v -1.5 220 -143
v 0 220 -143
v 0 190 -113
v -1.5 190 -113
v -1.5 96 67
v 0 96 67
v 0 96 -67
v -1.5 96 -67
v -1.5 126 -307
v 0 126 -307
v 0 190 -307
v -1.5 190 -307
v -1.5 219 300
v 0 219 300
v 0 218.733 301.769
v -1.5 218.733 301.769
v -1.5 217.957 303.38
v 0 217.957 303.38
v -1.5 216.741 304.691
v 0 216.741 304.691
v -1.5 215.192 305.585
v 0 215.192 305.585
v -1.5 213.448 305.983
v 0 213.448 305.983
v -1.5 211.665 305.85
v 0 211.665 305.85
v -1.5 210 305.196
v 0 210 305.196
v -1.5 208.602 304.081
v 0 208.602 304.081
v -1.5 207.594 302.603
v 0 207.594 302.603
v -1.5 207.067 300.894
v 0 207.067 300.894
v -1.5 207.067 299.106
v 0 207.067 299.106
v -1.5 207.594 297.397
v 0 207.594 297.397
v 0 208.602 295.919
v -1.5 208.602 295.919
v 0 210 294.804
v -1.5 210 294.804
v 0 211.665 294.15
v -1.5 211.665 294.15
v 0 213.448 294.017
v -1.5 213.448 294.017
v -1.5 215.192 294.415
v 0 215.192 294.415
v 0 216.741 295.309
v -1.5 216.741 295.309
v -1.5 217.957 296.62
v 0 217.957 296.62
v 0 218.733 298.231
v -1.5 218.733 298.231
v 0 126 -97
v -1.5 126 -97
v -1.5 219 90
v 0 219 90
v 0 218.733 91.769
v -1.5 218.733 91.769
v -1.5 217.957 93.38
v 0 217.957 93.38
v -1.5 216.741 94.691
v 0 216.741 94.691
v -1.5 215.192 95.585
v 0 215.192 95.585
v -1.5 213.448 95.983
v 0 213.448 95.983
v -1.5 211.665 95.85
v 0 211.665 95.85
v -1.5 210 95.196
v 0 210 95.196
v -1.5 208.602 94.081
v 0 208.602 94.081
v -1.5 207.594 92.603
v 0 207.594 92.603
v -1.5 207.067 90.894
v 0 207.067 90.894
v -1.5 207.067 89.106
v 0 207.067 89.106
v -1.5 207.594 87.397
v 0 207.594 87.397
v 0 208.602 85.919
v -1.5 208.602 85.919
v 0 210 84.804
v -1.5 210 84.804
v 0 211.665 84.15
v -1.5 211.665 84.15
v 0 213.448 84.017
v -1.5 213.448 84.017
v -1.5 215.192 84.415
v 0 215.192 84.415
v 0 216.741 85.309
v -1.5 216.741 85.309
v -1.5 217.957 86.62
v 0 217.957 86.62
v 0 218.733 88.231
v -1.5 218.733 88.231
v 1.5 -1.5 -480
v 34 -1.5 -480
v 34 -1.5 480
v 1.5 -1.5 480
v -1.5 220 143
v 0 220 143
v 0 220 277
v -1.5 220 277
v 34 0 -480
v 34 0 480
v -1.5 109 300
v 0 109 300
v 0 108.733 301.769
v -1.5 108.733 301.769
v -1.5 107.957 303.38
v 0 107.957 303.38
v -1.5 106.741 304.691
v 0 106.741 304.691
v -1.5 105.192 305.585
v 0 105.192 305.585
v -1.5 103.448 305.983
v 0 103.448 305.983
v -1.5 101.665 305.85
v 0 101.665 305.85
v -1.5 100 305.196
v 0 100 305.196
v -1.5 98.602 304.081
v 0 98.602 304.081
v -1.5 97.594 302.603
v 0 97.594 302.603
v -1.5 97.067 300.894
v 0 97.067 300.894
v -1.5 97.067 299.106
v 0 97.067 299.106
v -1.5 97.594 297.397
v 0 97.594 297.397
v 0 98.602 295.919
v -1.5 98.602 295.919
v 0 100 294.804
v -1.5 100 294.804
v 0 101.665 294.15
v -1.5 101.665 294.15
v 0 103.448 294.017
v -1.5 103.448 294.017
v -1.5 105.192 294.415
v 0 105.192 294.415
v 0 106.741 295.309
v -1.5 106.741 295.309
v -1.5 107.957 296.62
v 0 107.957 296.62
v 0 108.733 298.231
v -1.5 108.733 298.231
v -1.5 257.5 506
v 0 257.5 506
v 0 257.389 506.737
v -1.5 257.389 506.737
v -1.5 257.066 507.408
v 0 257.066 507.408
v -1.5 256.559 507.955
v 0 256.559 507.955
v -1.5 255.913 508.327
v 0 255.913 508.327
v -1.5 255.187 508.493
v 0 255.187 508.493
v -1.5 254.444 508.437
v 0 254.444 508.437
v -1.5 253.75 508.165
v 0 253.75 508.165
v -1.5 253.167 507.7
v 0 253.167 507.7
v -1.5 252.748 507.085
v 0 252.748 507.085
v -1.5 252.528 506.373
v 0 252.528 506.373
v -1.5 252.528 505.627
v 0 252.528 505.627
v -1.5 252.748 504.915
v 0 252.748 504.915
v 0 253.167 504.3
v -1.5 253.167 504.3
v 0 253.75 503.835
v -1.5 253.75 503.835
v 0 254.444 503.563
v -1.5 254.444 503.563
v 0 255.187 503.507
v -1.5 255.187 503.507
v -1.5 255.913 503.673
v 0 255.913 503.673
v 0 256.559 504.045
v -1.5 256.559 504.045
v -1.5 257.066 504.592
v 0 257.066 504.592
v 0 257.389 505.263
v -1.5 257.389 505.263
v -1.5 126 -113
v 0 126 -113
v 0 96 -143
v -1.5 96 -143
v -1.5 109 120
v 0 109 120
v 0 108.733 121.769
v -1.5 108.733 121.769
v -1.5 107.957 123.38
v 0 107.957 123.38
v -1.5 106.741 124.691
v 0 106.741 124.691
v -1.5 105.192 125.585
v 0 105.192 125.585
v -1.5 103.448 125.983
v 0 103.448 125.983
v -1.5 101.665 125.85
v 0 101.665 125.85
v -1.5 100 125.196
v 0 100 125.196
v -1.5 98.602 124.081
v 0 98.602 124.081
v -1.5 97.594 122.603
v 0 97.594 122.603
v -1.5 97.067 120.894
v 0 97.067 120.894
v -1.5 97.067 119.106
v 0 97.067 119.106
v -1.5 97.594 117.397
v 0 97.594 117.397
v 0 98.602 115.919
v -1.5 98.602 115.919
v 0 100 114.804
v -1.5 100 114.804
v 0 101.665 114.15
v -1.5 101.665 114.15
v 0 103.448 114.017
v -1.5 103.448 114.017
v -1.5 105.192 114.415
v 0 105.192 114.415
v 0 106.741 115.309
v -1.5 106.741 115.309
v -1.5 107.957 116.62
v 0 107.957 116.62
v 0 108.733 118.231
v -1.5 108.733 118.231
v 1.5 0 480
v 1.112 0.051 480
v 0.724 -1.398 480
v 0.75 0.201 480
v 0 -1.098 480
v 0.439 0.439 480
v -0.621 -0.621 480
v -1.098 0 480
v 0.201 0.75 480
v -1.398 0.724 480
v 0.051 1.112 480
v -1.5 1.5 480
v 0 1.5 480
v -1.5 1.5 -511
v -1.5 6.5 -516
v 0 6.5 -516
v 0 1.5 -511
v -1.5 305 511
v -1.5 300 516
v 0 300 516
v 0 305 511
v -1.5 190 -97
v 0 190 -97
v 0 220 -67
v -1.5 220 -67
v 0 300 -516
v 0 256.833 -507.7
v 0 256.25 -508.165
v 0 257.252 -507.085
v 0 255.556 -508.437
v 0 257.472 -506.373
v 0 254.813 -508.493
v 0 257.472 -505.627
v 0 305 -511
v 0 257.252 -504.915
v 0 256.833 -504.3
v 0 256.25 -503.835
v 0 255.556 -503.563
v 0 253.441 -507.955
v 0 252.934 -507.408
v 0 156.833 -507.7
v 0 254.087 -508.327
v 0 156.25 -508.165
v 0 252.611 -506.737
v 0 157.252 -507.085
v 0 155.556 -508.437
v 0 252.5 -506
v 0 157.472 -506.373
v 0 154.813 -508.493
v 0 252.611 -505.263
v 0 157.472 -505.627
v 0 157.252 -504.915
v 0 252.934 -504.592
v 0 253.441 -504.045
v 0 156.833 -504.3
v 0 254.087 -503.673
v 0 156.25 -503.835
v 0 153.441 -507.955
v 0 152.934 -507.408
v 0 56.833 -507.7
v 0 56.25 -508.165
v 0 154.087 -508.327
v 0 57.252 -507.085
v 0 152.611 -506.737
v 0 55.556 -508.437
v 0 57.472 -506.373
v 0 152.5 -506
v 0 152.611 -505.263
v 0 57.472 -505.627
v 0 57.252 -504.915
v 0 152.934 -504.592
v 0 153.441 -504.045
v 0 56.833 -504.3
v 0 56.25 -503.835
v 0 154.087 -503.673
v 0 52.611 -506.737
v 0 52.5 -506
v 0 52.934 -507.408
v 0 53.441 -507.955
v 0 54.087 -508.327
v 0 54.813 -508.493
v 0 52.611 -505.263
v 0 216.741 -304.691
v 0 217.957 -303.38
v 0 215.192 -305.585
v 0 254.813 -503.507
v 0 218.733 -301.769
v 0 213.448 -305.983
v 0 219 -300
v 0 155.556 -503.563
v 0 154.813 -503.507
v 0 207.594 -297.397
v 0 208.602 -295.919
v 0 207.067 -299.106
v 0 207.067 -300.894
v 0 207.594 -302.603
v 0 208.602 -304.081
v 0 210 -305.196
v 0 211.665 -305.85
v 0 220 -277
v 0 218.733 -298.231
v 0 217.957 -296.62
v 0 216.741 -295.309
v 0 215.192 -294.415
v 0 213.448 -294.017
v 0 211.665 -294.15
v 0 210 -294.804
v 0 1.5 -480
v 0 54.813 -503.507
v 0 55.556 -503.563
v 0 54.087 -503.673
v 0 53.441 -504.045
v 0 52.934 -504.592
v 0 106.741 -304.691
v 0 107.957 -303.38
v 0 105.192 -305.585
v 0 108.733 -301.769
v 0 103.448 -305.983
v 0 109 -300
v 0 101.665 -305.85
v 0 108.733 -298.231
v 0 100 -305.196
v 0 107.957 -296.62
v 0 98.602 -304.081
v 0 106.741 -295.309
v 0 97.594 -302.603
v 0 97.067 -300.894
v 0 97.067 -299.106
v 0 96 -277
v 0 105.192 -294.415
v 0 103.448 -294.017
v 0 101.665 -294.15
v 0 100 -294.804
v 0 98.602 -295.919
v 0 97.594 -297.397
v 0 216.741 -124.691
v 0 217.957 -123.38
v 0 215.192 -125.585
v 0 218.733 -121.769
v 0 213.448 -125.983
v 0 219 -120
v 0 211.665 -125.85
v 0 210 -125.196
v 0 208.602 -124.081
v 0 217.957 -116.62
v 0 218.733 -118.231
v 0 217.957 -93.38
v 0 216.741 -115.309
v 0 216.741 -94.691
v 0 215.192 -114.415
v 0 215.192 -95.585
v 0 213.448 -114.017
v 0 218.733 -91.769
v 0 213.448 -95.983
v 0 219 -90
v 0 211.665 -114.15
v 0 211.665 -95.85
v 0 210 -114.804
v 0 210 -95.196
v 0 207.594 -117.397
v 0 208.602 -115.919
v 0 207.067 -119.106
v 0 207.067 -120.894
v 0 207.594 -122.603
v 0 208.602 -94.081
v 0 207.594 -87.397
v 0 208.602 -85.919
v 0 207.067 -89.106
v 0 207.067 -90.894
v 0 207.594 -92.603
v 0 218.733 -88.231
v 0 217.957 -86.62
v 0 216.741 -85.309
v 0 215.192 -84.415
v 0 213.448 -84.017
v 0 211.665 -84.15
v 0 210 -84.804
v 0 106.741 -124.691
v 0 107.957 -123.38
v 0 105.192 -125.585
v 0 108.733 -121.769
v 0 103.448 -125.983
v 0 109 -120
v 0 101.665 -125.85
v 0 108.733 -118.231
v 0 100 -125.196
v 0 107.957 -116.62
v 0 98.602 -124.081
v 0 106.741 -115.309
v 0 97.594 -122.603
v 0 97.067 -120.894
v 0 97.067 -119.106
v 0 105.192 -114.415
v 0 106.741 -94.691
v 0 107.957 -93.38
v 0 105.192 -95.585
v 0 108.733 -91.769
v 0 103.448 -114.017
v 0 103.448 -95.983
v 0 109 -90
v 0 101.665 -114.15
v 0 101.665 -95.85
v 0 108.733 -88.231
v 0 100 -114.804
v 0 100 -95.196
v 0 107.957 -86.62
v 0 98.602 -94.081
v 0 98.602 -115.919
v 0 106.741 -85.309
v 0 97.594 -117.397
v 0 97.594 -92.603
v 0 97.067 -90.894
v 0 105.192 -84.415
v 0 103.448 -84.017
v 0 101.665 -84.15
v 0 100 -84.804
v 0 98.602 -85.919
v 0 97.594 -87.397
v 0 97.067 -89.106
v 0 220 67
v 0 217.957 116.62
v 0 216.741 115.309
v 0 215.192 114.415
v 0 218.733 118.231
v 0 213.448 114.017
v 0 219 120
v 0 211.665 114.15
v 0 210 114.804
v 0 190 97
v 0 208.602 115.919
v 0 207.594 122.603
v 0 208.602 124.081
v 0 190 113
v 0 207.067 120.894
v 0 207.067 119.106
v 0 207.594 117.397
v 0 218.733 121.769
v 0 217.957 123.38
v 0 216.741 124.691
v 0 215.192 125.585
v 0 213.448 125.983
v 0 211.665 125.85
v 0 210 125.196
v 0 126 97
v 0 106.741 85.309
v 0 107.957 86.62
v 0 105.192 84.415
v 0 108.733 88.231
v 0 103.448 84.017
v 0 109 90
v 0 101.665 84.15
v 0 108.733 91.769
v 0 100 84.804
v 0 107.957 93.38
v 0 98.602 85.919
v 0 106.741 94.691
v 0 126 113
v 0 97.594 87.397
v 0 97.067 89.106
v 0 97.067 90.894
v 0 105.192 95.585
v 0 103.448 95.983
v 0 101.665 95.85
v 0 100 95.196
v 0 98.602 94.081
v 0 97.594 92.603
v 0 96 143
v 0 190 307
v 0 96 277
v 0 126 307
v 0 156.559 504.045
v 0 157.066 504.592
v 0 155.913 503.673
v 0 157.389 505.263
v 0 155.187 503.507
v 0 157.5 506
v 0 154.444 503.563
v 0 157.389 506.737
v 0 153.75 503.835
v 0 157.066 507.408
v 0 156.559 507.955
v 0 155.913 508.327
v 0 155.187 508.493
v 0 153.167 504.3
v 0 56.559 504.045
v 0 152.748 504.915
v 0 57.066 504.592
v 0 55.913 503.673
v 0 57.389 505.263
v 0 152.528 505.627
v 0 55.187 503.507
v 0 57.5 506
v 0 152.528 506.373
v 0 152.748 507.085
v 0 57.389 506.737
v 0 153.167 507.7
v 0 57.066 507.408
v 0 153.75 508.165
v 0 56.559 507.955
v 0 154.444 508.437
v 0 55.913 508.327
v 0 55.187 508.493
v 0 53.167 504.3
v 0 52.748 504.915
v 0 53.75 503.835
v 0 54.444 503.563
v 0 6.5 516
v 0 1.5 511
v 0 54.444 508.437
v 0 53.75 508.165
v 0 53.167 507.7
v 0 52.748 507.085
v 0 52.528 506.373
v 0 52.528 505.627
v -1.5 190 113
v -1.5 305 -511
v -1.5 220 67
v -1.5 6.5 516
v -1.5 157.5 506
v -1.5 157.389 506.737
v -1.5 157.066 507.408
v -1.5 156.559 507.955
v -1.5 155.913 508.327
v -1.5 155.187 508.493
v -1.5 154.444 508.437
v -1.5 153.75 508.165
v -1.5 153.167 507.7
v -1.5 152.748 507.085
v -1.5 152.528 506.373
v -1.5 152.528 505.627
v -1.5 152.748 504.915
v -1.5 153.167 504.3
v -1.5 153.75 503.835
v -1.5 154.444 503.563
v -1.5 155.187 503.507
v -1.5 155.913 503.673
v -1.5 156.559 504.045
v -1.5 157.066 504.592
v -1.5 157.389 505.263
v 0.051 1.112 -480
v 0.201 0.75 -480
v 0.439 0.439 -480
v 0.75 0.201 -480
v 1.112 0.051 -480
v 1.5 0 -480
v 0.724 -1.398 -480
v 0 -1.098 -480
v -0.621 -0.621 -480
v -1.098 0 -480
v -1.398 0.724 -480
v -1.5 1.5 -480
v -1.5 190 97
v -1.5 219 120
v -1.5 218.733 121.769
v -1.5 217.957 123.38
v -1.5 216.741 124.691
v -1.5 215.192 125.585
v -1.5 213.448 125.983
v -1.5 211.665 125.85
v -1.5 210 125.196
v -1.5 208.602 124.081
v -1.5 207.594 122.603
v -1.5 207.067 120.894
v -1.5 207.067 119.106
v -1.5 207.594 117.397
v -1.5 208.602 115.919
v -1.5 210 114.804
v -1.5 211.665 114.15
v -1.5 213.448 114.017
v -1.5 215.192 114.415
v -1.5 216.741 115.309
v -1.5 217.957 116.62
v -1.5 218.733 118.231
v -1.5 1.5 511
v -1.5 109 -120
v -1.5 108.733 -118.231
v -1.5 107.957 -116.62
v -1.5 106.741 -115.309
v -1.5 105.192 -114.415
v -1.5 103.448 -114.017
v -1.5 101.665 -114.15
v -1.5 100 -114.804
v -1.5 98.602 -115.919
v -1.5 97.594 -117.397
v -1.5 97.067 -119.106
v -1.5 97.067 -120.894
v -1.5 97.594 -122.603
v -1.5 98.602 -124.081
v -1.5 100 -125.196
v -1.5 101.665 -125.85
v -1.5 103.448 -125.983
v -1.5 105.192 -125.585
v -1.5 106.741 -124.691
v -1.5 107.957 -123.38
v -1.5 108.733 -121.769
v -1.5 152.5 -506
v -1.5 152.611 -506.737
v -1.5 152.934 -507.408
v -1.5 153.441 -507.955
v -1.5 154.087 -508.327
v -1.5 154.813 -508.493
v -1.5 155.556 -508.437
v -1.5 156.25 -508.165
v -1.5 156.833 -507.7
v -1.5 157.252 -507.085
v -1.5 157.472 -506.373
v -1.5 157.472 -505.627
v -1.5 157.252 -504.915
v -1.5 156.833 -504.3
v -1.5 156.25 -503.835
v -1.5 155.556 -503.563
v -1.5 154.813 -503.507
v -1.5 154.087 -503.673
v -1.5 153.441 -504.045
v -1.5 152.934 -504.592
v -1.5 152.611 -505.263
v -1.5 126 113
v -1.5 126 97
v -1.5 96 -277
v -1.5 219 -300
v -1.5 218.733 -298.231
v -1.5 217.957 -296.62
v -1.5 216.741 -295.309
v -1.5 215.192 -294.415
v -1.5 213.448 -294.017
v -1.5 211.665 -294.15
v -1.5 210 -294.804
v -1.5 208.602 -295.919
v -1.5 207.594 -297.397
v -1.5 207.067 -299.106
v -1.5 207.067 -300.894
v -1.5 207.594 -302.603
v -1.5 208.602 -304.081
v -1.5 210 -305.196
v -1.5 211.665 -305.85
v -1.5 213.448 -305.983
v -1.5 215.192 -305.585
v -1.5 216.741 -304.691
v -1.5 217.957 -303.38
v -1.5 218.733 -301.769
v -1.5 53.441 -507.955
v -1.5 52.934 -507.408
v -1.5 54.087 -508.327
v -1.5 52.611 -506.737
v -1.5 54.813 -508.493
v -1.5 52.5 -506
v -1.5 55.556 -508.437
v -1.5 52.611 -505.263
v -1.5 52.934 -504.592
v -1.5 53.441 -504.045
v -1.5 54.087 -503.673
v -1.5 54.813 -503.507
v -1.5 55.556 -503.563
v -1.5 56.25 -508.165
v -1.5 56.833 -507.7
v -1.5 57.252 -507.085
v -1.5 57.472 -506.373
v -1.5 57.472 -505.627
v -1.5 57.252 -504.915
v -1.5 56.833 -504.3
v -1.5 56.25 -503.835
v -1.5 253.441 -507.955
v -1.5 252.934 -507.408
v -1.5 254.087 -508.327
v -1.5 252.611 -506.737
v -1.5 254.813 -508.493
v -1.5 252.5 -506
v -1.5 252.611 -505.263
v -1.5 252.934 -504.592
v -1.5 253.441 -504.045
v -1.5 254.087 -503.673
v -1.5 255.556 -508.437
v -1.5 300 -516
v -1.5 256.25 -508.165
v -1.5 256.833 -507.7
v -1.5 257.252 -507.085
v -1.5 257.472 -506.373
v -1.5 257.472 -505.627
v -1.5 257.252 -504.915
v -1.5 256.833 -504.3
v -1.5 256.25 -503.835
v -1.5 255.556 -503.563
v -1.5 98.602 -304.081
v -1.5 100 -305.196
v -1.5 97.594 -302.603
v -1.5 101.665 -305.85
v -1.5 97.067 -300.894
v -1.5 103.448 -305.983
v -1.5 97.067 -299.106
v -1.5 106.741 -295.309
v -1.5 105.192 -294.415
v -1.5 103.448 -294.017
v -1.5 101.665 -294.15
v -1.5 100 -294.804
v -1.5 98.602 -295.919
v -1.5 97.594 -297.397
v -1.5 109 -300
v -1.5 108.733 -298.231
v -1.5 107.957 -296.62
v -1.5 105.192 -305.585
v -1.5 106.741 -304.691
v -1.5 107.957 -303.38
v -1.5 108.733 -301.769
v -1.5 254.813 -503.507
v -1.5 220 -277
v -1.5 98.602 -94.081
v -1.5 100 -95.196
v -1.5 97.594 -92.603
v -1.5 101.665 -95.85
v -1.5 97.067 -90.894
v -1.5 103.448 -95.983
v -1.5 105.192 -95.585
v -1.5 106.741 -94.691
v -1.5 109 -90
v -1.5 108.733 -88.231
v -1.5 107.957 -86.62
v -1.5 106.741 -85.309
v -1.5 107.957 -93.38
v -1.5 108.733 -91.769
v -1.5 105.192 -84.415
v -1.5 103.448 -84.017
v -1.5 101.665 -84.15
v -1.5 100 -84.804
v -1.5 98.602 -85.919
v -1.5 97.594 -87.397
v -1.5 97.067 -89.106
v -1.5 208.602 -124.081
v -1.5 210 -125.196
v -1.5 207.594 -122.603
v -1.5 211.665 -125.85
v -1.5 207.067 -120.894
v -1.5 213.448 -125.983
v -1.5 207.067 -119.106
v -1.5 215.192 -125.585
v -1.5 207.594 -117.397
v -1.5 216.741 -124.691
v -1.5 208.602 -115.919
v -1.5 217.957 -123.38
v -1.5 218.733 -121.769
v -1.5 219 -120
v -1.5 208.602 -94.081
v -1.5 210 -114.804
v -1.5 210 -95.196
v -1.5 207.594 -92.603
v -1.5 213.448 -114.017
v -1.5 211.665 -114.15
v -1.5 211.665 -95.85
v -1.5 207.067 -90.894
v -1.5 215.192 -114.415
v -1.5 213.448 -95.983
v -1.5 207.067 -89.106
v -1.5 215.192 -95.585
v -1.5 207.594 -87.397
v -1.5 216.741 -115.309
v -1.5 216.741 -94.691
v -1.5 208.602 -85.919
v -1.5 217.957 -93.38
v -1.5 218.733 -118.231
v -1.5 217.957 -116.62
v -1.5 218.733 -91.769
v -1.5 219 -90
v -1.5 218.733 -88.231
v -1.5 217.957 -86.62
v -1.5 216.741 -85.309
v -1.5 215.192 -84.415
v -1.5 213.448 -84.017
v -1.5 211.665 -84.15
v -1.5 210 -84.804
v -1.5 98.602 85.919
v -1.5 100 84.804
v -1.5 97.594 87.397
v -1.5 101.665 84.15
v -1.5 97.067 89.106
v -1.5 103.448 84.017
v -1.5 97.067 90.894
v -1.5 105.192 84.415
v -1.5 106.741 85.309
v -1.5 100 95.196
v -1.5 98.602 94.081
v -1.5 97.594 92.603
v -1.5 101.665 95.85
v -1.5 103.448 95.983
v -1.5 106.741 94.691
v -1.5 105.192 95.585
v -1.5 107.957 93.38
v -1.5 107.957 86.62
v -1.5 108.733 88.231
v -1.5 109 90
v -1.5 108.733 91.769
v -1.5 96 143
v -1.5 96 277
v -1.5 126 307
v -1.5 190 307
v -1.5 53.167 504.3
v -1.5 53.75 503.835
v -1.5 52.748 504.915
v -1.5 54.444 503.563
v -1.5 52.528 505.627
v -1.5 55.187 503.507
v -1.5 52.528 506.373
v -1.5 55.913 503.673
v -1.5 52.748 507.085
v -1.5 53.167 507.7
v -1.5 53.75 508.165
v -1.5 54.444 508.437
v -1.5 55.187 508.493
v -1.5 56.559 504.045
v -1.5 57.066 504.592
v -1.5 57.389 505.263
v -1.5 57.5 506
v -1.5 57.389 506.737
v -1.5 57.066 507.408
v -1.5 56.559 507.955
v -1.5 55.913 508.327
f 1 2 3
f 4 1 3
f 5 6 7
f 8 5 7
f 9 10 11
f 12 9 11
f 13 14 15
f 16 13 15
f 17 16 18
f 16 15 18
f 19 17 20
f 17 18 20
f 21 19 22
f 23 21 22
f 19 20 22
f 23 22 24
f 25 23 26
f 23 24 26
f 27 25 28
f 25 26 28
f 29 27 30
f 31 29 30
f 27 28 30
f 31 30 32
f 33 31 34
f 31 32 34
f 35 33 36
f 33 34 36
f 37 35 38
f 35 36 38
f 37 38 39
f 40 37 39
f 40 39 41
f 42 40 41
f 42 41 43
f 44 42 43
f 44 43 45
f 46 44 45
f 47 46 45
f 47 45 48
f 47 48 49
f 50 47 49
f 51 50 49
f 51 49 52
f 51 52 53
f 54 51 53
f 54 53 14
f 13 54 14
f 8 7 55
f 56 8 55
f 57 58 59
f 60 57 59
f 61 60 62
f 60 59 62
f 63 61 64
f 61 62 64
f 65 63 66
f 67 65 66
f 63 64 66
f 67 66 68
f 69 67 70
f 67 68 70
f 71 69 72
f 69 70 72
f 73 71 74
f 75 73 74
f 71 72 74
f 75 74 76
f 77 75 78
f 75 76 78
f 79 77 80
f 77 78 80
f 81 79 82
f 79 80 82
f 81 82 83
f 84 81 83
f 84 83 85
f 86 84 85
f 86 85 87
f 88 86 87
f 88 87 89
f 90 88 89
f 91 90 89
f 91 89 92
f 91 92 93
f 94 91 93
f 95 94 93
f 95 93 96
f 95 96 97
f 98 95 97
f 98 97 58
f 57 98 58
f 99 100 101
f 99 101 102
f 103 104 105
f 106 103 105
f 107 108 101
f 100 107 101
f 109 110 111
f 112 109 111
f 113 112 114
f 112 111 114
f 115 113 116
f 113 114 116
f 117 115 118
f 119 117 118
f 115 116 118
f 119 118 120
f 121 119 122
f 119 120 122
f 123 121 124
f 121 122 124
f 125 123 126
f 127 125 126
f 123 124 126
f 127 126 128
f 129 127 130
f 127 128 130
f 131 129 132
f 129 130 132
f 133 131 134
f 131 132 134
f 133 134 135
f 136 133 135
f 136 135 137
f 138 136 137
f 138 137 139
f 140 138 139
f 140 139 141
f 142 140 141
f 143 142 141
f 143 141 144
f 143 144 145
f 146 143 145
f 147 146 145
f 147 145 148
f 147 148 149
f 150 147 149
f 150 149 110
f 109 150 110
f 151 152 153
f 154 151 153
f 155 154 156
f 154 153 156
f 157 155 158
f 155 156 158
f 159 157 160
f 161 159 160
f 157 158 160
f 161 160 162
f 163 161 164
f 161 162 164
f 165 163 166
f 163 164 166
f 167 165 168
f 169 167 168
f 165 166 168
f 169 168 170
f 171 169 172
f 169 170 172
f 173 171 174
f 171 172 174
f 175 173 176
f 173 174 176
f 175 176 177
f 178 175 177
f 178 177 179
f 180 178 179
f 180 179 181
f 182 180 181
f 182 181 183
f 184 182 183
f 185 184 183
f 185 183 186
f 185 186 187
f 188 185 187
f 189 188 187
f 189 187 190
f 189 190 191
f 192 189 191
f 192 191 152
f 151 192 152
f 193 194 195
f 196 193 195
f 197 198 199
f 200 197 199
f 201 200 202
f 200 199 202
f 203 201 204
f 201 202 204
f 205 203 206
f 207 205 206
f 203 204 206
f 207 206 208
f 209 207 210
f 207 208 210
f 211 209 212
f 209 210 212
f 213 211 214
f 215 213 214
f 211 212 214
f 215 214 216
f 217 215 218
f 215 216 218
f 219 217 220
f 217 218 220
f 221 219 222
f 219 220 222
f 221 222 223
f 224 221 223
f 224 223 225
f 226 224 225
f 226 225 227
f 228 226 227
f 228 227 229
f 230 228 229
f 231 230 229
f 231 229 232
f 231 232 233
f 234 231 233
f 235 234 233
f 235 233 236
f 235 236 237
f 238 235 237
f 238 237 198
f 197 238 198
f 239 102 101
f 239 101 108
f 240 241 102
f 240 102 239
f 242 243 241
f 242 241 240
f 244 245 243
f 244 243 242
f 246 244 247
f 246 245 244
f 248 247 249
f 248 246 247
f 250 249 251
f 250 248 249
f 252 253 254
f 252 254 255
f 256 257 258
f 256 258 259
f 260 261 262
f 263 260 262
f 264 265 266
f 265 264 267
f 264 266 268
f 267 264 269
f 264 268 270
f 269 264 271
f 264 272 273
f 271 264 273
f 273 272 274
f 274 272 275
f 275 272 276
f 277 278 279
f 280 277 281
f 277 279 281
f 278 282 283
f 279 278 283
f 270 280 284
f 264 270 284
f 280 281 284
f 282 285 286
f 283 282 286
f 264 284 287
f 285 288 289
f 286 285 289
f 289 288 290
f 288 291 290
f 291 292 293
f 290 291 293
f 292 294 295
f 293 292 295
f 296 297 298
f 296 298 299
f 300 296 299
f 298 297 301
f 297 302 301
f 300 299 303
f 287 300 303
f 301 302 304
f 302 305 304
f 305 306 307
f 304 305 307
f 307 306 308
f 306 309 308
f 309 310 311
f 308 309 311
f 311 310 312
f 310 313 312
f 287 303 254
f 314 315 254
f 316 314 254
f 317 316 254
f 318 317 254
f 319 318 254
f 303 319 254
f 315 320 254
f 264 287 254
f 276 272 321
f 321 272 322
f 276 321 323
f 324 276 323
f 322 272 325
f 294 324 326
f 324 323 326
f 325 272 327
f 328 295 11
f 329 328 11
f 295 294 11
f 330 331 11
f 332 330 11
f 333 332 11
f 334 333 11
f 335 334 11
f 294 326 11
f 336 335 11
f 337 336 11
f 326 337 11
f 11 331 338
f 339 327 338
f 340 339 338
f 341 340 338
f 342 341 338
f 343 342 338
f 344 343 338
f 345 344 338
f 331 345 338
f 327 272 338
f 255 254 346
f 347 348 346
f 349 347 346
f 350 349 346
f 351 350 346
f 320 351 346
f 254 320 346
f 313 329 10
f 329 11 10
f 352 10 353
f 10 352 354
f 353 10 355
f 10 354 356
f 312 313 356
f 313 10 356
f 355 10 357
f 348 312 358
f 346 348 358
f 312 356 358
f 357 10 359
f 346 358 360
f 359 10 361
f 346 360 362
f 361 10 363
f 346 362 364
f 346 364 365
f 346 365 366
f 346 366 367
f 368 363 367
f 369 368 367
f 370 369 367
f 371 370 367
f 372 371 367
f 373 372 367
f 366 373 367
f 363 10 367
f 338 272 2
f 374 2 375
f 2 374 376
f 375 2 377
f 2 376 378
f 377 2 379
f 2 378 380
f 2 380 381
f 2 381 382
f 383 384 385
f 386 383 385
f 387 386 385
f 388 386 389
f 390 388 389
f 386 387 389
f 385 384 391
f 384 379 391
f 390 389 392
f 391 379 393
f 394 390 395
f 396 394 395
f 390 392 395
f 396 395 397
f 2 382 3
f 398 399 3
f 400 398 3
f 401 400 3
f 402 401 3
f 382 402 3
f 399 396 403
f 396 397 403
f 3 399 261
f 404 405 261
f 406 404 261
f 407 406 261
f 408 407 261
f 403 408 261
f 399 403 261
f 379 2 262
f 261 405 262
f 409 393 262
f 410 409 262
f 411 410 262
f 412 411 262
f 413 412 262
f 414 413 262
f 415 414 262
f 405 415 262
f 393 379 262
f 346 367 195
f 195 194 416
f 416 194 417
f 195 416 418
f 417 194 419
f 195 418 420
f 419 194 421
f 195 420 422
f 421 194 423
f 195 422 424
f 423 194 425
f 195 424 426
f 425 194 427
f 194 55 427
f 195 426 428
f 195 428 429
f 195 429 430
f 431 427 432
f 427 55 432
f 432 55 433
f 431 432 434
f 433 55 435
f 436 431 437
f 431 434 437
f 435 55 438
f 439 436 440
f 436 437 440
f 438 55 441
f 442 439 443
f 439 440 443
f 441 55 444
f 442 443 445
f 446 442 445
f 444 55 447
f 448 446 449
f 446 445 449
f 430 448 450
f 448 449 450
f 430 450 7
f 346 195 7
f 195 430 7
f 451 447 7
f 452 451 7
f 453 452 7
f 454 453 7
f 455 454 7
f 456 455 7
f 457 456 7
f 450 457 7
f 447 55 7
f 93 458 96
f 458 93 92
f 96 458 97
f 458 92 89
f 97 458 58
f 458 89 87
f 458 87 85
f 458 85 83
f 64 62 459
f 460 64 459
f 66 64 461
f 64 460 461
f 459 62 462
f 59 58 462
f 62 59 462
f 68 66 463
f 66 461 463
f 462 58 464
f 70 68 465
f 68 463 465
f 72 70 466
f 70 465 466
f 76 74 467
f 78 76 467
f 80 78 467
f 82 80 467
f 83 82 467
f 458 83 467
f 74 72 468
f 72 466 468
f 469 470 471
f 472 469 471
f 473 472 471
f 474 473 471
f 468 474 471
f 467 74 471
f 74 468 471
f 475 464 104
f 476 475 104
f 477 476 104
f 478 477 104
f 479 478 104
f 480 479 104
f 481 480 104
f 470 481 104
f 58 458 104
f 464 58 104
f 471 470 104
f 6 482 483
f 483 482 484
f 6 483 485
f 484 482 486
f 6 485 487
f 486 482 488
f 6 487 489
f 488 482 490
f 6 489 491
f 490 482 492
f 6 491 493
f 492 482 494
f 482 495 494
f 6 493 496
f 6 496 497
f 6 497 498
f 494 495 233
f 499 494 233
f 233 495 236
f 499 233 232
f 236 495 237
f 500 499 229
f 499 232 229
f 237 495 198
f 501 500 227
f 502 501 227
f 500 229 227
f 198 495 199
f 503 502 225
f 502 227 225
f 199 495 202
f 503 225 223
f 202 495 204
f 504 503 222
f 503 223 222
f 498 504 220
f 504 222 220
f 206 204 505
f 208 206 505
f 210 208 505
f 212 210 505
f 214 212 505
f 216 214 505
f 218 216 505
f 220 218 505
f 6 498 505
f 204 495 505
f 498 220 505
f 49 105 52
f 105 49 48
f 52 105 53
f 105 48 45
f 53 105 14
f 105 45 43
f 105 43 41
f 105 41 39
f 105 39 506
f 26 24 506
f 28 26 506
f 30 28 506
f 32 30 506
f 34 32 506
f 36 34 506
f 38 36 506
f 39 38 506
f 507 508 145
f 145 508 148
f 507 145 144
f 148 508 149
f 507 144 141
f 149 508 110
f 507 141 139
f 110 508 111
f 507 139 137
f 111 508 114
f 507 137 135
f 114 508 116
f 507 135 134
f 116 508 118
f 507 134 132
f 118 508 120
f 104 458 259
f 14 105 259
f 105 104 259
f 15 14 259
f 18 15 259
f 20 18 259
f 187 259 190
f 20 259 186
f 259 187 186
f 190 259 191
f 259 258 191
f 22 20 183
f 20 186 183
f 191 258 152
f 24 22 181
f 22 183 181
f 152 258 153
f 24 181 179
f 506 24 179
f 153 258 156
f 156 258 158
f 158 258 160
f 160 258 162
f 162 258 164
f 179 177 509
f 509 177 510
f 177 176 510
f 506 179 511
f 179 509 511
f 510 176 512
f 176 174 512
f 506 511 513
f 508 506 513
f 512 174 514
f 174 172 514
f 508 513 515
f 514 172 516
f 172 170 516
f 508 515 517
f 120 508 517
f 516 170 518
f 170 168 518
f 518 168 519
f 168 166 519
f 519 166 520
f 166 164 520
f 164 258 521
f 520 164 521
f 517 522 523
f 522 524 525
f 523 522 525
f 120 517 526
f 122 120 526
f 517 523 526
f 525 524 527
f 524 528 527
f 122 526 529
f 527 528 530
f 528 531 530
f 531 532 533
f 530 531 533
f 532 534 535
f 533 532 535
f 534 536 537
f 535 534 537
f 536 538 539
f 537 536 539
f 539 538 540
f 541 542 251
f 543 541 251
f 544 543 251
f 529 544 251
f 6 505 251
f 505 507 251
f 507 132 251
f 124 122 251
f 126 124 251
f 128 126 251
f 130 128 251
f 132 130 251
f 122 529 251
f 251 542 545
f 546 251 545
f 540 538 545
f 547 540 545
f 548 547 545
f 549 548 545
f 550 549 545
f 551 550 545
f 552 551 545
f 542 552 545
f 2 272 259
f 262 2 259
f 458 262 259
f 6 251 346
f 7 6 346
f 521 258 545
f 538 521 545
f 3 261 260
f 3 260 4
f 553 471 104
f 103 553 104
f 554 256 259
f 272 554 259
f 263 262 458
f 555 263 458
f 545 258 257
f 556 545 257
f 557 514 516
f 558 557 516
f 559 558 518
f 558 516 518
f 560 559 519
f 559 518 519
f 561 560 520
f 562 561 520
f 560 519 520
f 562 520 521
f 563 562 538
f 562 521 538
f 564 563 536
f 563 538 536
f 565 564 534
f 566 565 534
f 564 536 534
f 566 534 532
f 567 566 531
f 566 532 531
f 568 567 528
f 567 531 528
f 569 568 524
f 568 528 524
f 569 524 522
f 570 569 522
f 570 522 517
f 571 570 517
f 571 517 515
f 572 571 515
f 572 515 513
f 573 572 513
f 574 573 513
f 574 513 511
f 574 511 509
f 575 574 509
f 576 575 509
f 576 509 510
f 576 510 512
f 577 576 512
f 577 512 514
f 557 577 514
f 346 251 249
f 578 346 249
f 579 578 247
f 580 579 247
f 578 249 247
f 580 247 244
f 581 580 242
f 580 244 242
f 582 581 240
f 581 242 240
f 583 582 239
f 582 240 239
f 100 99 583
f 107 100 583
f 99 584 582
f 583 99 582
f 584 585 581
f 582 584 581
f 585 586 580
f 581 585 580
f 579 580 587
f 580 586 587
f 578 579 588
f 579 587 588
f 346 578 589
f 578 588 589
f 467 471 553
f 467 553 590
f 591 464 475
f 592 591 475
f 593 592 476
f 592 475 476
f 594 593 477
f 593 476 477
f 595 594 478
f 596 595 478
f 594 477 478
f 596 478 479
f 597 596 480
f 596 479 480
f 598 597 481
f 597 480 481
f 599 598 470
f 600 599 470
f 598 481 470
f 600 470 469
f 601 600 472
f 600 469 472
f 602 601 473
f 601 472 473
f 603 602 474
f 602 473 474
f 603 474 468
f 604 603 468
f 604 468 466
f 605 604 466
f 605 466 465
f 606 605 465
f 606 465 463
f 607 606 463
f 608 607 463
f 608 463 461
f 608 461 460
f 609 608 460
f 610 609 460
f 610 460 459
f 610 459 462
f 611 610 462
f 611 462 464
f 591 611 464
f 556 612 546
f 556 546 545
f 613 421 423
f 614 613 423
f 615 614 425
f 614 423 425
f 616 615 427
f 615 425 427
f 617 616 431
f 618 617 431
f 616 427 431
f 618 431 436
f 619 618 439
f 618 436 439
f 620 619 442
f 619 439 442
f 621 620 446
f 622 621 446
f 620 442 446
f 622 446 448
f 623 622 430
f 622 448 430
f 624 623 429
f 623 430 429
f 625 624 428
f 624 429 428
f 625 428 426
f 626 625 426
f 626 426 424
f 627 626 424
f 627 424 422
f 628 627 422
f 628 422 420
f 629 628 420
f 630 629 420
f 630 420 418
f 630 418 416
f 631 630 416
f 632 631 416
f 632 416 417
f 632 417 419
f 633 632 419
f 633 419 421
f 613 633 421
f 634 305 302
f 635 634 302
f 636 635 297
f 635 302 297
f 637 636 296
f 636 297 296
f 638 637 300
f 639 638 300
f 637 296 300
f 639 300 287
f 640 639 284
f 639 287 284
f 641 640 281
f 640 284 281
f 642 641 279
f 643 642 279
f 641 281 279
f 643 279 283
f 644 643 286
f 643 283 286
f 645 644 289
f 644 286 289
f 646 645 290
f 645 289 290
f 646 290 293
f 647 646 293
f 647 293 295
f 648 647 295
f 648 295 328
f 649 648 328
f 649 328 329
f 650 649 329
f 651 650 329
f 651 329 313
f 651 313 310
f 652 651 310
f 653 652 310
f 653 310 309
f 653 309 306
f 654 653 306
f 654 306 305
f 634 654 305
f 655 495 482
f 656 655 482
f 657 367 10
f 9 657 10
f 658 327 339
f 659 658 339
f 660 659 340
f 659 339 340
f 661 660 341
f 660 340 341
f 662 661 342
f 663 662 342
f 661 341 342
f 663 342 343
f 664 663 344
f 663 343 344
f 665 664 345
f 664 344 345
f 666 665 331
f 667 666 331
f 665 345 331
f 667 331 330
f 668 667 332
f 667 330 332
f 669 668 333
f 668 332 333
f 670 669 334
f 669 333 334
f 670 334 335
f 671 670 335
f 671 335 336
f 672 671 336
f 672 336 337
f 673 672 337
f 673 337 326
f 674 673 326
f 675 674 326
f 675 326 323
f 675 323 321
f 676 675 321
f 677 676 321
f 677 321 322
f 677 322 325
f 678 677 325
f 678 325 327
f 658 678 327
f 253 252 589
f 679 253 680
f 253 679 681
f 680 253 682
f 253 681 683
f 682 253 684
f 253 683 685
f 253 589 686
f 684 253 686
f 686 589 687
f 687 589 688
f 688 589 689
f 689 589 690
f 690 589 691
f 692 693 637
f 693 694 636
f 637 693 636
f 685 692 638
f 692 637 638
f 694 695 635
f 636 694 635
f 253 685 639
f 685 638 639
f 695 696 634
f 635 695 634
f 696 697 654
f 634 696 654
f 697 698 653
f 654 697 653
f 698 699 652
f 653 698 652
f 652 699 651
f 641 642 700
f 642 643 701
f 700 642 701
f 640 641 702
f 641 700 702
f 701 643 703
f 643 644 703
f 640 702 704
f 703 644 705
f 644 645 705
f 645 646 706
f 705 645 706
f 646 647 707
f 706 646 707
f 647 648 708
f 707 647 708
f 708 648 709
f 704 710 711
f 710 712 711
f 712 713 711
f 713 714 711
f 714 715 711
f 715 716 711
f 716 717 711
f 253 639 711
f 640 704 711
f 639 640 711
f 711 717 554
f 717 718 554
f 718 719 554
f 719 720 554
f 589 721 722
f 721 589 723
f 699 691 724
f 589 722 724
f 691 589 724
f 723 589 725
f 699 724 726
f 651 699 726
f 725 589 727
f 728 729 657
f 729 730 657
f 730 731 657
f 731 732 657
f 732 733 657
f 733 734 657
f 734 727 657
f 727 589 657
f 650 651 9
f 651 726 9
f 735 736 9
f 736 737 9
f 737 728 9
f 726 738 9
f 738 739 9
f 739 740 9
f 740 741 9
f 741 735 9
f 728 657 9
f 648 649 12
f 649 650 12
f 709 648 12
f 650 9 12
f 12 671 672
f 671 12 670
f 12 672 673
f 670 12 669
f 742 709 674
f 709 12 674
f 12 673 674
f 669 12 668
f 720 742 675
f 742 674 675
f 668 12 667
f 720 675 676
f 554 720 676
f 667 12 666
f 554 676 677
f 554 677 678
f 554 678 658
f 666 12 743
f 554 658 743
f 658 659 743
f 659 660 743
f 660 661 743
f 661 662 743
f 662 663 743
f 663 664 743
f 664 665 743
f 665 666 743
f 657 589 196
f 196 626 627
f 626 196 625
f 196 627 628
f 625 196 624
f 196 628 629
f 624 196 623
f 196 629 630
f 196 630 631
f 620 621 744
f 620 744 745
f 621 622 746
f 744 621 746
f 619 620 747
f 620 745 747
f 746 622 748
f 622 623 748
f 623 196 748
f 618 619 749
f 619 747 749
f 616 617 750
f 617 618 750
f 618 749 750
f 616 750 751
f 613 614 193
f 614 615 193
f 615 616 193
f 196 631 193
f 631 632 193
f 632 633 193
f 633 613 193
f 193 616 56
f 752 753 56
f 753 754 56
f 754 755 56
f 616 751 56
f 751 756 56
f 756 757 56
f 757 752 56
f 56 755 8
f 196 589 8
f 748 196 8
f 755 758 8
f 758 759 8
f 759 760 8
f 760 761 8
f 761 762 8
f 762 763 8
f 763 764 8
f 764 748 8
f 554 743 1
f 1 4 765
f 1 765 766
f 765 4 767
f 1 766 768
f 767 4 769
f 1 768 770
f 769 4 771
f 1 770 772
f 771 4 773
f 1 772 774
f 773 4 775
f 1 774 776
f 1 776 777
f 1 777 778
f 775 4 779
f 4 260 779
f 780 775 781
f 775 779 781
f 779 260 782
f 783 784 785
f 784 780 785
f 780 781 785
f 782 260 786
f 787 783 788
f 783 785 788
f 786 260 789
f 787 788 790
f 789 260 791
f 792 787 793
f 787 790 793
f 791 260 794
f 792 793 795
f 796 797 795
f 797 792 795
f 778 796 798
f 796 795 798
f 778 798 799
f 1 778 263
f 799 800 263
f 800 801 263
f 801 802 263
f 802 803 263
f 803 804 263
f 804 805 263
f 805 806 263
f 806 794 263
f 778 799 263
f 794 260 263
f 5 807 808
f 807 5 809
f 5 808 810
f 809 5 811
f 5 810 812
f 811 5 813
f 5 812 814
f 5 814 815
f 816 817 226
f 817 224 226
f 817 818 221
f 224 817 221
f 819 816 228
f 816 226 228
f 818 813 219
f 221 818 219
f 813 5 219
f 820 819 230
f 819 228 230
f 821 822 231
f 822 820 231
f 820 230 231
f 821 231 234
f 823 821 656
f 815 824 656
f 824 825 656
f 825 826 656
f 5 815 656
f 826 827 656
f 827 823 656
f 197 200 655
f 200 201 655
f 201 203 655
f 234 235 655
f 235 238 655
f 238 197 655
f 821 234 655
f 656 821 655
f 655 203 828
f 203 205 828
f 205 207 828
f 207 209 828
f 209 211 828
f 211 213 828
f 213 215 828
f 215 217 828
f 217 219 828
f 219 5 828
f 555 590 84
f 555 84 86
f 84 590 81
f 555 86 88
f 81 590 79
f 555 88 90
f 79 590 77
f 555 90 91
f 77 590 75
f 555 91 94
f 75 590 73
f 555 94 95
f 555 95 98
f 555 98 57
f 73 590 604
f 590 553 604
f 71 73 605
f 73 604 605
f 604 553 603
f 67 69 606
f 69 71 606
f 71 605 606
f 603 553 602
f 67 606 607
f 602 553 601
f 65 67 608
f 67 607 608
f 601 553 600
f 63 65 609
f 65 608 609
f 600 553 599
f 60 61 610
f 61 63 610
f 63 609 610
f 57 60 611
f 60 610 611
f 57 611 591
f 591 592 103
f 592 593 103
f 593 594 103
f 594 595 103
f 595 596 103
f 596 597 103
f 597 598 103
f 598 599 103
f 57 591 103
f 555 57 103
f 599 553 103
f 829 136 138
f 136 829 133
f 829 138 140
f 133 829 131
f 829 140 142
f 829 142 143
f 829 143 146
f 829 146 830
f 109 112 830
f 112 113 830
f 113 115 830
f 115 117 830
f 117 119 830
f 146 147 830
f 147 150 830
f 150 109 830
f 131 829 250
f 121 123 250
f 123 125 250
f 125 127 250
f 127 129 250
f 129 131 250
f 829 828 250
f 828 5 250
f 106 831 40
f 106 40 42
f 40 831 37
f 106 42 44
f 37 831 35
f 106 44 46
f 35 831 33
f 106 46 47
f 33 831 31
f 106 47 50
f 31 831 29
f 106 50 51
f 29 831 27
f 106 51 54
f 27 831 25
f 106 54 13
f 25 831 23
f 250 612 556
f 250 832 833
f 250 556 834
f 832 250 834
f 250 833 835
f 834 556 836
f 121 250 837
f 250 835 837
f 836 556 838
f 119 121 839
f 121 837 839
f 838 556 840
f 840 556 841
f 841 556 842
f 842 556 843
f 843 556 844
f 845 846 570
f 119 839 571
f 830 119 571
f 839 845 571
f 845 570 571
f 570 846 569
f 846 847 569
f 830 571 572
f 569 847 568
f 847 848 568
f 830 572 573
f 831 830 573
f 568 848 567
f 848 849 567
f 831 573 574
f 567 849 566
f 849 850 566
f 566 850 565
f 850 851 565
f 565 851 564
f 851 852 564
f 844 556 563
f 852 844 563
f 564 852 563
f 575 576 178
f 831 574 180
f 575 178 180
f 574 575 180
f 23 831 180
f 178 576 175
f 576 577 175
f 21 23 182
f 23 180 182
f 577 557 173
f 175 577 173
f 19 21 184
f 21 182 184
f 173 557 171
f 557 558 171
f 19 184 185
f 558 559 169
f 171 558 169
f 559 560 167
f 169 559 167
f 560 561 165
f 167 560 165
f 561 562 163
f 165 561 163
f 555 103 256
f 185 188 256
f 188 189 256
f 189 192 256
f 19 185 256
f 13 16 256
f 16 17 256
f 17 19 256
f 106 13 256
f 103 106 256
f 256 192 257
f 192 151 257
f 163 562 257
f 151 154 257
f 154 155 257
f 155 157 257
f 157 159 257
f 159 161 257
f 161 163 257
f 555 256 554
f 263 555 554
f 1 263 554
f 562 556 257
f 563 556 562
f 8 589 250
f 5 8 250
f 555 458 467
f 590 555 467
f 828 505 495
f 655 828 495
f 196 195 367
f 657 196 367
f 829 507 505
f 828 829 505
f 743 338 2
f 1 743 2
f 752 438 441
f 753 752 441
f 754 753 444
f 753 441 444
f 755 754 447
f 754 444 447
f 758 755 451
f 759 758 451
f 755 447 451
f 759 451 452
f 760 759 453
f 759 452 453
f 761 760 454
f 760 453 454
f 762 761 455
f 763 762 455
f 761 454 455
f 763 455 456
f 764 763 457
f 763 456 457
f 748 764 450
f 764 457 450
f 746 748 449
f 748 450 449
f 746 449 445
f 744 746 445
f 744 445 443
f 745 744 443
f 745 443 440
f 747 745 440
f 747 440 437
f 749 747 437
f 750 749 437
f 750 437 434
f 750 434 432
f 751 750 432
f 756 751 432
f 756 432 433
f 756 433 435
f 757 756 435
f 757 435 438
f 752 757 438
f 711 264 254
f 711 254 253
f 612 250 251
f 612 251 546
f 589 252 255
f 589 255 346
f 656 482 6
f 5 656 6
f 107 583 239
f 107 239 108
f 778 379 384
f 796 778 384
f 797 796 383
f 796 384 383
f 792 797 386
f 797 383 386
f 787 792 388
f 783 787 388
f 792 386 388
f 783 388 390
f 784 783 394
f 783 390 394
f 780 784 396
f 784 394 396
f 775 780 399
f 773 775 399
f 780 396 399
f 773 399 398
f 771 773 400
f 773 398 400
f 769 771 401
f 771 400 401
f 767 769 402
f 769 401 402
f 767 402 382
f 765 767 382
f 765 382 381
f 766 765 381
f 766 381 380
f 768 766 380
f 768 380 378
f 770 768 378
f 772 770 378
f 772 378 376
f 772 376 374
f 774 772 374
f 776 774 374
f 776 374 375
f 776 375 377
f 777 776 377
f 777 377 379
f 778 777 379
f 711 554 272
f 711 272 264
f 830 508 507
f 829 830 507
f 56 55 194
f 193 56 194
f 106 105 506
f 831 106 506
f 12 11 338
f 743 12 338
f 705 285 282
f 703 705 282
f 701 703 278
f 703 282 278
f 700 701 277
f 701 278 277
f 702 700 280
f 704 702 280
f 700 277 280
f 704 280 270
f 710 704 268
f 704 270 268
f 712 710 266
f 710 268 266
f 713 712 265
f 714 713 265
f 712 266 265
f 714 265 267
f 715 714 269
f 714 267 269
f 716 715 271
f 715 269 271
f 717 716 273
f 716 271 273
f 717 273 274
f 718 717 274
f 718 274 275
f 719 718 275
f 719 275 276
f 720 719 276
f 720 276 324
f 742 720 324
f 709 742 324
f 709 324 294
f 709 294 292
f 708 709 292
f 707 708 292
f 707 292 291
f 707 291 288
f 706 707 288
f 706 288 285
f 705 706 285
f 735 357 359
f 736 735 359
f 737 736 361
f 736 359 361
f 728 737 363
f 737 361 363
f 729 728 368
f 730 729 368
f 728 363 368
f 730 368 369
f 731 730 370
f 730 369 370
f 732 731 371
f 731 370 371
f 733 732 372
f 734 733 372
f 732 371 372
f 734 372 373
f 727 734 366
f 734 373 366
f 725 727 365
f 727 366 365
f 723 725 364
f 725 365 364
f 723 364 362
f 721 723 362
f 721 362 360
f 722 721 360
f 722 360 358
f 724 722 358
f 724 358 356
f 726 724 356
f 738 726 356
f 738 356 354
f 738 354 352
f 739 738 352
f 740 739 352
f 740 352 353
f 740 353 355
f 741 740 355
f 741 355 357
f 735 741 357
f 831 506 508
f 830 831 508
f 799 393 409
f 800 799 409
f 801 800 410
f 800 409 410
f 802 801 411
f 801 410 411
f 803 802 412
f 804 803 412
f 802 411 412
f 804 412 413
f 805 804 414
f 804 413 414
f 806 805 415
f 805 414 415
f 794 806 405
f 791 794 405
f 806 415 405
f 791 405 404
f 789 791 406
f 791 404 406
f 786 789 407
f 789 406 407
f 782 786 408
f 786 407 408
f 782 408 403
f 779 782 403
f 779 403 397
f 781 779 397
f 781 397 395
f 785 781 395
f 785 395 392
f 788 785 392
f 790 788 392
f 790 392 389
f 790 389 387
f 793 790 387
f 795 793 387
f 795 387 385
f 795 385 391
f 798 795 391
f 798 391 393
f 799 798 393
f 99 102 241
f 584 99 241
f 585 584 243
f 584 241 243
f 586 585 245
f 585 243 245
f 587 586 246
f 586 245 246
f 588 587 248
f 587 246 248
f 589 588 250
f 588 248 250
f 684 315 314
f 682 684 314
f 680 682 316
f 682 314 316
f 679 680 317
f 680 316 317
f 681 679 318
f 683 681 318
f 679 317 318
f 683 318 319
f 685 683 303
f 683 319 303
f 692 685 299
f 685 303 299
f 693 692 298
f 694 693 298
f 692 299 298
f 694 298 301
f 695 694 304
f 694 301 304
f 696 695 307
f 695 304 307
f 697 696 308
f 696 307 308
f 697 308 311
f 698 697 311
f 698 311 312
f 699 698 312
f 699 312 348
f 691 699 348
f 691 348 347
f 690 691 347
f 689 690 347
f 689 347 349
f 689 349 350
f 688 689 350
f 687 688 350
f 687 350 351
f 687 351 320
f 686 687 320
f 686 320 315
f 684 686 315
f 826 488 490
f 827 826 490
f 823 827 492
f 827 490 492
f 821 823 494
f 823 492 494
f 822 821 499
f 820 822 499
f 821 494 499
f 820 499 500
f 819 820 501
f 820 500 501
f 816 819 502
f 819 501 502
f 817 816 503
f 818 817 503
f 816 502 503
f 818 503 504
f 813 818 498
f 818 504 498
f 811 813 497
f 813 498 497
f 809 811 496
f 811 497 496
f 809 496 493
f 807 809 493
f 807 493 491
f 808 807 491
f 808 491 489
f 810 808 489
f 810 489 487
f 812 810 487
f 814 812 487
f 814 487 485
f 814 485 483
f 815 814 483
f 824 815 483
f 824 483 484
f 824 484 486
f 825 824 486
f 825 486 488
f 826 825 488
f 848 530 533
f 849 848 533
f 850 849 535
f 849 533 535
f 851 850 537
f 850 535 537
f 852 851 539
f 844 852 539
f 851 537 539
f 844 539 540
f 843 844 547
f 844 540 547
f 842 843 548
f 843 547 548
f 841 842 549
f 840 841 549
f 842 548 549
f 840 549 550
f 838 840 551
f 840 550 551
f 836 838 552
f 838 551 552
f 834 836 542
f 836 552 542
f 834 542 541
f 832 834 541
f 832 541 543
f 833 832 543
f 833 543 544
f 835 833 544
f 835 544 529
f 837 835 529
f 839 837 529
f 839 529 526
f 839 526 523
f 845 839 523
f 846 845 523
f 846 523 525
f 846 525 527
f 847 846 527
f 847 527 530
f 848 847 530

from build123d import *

# Parameters (mm, degrees)
SM_BASE_FLANGE_1_DEPTH = 516
SKETCH_7_W             = 36
SKETCH_7_H             = 3
CUT_EXTRUDE_1_DEPTH    = 601.450872262
OTHER_START            = -1.5
OTHER_1_DEPTH          = 1.5
SKETCH_8_R             = 6
CUT_EXTRUDE_1446_DEPTH = 10
PATTERN_LINEAR_1_COUNT = 3
PATTERN_LINEAR_1_PITCH = 210
SKETCH_9_R             = 2.5
CUT_EXTRUDE_3_DEPTH    = 10
SKETCH_10_W            = 16
SKETCH_10_H            = 64
CUT_EXTRUDE_4_DEPTH    = 10


# Read off the part's stored shape, not the designer's step: Затупленный угол1
# Sheet-metal steps are written as plain solids
with BuildPart() as part:
    # Sketch 1 → Базовая кромка1 (new, symmetric)
    with BuildSketch(Plane.XY):
        with BuildLine():
            Line((0, 305), (0, 1.5))
            ThreePointArc((0, 1.5), (0.439339828, 0.439339828), (1.5, 0))
            Line((1.5, 0), (34, 0))
            Line((34, 0), (34, -1.5))
            Line((34, -1.5), (1.5, -1.5))
            ThreePointArc((1.5, -1.5), (-0.621320344, -0.621320344), (-1.5, 1.5))
            Line((-1.5, 1.5), (-1.5, 305))
            Line((-1.5, 305), (0, 305))
        make_face()
    extrude(amount=SM_BASE_FLANGE_1_DEPTH, both=True)

    # Эскиз7 → Вырез-Вытянуть1 (cut, through all)
    with BuildSketch(Plane.ZY.offset(1.5)):
        with Locations((-498, 0)):
            Rectangle(SKETCH_7_W, SKETCH_7_H)
        with Locations((498, 0)):
            Rectangle(SKETCH_7_W, SKETCH_7_H)
    extrude(amount=-CUT_EXTRUDE_1_DEPTH, mode=Mode.SUBTRACT)

    # Other 1 outline → Other 1 (cut)
    with BuildSketch(Plane.YZ.offset(OTHER_START)):
        Polygon((1.5, 516), (1.5, 511), (6.5, 516), align=None)
        Polygon((1.5, -516), (6.5, -516), (1.5, -511), align=None)
        Polygon((305, -516), (305, -511), (300, -516), align=None)
        Polygon((305, 516), (300, 516), (305, 511), align=None)
    extrude(amount=OTHER_1_DEPTH, mode=Mode.SUBTRACT)

    # Эскиз8 → Cut-Extrude 1446 (cut)
    with BuildSketch(Plane(origin=(0, 0, 0), x_dir=(0, 0, -1), z_dir=(1, 0, 0))):
        with Locations(Location((-300, 213, 0), (0, 0, 90))):
            Circle(SKETCH_8_R)
        with Locations(Location((-300, 103, 0), (0, 0, 90))):
            Circle(SKETCH_8_R)
        with Locations(Location((-120, 103, 0), (0, 0, 90))):
            Circle(SKETCH_8_R)
        with Locations(Location((-120, 213, 0), (0, 0, 90))):
            Circle(SKETCH_8_R)
        Polygon((-307, 126), (-277, 96), (-143, 96), (-113, 126), (-113, 190), (-143, 220), (-277, 220), (-307, 190), align=None)
    cut_extrude_1446 = extrude(amount=-CUT_EXTRUDE_1446_DEPTH, mode=Mode.SUBTRACT)

    # Линейный массив1: Cut-Extrude 1446 ×3
    with Locations(*[(0, 0, -i * PATTERN_LINEAR_1_PITCH) for i in range(1, PATTERN_LINEAR_1_COUNT)]):
        add(cut_extrude_1446, mode=Mode.SUBTRACT)

    # Эскиз9 → Вырез-Вытянуть3 (cut)
    with BuildSketch(Plane(origin=(0, 0, 0), x_dir=(0, 0, -1), z_dir=(1, 0, 0))):
        with Locations(Location((-506, 255, 0), (0, 0, 90))):
            Circle(SKETCH_9_R)
        with Locations(Location((-506, 155, 0), (0, 0, 90))):
            Circle(SKETCH_9_R)
        with Locations(Location((-506, 55, 0), (0, 0, 90))):
            Circle(SKETCH_9_R)
        with Locations(Location((506, 55, 0), (0, 0, 270))):
            Circle(SKETCH_9_R)
        with Locations(Location((506, 155, 0), (0, 0, 270))):
            Circle(SKETCH_9_R)
        with Locations(Location((506, 255, 0), (0, 0, 270))):
            Circle(SKETCH_9_R)
    extrude(amount=-CUT_EXTRUDE_3_DEPTH, mode=Mode.SUBTRACT)

    # Эскиз10 → Вырез-Вытянуть4 (cut)
    with BuildSketch(Plane(origin=(0, 0, 0), x_dir=(0, 0, -1), z_dir=(1, 0, 0))):
        with Locations((-105, 158)):
            Rectangle(SKETCH_10_W, SKETCH_10_H)
        with Locations((105, 158)):
            Rectangle(SKETCH_10_W, SKETCH_10_H)
    extrude(amount=-CUT_EXTRUDE_4_DEPTH, mode=Mode.SUBTRACT)


solid = part.part
